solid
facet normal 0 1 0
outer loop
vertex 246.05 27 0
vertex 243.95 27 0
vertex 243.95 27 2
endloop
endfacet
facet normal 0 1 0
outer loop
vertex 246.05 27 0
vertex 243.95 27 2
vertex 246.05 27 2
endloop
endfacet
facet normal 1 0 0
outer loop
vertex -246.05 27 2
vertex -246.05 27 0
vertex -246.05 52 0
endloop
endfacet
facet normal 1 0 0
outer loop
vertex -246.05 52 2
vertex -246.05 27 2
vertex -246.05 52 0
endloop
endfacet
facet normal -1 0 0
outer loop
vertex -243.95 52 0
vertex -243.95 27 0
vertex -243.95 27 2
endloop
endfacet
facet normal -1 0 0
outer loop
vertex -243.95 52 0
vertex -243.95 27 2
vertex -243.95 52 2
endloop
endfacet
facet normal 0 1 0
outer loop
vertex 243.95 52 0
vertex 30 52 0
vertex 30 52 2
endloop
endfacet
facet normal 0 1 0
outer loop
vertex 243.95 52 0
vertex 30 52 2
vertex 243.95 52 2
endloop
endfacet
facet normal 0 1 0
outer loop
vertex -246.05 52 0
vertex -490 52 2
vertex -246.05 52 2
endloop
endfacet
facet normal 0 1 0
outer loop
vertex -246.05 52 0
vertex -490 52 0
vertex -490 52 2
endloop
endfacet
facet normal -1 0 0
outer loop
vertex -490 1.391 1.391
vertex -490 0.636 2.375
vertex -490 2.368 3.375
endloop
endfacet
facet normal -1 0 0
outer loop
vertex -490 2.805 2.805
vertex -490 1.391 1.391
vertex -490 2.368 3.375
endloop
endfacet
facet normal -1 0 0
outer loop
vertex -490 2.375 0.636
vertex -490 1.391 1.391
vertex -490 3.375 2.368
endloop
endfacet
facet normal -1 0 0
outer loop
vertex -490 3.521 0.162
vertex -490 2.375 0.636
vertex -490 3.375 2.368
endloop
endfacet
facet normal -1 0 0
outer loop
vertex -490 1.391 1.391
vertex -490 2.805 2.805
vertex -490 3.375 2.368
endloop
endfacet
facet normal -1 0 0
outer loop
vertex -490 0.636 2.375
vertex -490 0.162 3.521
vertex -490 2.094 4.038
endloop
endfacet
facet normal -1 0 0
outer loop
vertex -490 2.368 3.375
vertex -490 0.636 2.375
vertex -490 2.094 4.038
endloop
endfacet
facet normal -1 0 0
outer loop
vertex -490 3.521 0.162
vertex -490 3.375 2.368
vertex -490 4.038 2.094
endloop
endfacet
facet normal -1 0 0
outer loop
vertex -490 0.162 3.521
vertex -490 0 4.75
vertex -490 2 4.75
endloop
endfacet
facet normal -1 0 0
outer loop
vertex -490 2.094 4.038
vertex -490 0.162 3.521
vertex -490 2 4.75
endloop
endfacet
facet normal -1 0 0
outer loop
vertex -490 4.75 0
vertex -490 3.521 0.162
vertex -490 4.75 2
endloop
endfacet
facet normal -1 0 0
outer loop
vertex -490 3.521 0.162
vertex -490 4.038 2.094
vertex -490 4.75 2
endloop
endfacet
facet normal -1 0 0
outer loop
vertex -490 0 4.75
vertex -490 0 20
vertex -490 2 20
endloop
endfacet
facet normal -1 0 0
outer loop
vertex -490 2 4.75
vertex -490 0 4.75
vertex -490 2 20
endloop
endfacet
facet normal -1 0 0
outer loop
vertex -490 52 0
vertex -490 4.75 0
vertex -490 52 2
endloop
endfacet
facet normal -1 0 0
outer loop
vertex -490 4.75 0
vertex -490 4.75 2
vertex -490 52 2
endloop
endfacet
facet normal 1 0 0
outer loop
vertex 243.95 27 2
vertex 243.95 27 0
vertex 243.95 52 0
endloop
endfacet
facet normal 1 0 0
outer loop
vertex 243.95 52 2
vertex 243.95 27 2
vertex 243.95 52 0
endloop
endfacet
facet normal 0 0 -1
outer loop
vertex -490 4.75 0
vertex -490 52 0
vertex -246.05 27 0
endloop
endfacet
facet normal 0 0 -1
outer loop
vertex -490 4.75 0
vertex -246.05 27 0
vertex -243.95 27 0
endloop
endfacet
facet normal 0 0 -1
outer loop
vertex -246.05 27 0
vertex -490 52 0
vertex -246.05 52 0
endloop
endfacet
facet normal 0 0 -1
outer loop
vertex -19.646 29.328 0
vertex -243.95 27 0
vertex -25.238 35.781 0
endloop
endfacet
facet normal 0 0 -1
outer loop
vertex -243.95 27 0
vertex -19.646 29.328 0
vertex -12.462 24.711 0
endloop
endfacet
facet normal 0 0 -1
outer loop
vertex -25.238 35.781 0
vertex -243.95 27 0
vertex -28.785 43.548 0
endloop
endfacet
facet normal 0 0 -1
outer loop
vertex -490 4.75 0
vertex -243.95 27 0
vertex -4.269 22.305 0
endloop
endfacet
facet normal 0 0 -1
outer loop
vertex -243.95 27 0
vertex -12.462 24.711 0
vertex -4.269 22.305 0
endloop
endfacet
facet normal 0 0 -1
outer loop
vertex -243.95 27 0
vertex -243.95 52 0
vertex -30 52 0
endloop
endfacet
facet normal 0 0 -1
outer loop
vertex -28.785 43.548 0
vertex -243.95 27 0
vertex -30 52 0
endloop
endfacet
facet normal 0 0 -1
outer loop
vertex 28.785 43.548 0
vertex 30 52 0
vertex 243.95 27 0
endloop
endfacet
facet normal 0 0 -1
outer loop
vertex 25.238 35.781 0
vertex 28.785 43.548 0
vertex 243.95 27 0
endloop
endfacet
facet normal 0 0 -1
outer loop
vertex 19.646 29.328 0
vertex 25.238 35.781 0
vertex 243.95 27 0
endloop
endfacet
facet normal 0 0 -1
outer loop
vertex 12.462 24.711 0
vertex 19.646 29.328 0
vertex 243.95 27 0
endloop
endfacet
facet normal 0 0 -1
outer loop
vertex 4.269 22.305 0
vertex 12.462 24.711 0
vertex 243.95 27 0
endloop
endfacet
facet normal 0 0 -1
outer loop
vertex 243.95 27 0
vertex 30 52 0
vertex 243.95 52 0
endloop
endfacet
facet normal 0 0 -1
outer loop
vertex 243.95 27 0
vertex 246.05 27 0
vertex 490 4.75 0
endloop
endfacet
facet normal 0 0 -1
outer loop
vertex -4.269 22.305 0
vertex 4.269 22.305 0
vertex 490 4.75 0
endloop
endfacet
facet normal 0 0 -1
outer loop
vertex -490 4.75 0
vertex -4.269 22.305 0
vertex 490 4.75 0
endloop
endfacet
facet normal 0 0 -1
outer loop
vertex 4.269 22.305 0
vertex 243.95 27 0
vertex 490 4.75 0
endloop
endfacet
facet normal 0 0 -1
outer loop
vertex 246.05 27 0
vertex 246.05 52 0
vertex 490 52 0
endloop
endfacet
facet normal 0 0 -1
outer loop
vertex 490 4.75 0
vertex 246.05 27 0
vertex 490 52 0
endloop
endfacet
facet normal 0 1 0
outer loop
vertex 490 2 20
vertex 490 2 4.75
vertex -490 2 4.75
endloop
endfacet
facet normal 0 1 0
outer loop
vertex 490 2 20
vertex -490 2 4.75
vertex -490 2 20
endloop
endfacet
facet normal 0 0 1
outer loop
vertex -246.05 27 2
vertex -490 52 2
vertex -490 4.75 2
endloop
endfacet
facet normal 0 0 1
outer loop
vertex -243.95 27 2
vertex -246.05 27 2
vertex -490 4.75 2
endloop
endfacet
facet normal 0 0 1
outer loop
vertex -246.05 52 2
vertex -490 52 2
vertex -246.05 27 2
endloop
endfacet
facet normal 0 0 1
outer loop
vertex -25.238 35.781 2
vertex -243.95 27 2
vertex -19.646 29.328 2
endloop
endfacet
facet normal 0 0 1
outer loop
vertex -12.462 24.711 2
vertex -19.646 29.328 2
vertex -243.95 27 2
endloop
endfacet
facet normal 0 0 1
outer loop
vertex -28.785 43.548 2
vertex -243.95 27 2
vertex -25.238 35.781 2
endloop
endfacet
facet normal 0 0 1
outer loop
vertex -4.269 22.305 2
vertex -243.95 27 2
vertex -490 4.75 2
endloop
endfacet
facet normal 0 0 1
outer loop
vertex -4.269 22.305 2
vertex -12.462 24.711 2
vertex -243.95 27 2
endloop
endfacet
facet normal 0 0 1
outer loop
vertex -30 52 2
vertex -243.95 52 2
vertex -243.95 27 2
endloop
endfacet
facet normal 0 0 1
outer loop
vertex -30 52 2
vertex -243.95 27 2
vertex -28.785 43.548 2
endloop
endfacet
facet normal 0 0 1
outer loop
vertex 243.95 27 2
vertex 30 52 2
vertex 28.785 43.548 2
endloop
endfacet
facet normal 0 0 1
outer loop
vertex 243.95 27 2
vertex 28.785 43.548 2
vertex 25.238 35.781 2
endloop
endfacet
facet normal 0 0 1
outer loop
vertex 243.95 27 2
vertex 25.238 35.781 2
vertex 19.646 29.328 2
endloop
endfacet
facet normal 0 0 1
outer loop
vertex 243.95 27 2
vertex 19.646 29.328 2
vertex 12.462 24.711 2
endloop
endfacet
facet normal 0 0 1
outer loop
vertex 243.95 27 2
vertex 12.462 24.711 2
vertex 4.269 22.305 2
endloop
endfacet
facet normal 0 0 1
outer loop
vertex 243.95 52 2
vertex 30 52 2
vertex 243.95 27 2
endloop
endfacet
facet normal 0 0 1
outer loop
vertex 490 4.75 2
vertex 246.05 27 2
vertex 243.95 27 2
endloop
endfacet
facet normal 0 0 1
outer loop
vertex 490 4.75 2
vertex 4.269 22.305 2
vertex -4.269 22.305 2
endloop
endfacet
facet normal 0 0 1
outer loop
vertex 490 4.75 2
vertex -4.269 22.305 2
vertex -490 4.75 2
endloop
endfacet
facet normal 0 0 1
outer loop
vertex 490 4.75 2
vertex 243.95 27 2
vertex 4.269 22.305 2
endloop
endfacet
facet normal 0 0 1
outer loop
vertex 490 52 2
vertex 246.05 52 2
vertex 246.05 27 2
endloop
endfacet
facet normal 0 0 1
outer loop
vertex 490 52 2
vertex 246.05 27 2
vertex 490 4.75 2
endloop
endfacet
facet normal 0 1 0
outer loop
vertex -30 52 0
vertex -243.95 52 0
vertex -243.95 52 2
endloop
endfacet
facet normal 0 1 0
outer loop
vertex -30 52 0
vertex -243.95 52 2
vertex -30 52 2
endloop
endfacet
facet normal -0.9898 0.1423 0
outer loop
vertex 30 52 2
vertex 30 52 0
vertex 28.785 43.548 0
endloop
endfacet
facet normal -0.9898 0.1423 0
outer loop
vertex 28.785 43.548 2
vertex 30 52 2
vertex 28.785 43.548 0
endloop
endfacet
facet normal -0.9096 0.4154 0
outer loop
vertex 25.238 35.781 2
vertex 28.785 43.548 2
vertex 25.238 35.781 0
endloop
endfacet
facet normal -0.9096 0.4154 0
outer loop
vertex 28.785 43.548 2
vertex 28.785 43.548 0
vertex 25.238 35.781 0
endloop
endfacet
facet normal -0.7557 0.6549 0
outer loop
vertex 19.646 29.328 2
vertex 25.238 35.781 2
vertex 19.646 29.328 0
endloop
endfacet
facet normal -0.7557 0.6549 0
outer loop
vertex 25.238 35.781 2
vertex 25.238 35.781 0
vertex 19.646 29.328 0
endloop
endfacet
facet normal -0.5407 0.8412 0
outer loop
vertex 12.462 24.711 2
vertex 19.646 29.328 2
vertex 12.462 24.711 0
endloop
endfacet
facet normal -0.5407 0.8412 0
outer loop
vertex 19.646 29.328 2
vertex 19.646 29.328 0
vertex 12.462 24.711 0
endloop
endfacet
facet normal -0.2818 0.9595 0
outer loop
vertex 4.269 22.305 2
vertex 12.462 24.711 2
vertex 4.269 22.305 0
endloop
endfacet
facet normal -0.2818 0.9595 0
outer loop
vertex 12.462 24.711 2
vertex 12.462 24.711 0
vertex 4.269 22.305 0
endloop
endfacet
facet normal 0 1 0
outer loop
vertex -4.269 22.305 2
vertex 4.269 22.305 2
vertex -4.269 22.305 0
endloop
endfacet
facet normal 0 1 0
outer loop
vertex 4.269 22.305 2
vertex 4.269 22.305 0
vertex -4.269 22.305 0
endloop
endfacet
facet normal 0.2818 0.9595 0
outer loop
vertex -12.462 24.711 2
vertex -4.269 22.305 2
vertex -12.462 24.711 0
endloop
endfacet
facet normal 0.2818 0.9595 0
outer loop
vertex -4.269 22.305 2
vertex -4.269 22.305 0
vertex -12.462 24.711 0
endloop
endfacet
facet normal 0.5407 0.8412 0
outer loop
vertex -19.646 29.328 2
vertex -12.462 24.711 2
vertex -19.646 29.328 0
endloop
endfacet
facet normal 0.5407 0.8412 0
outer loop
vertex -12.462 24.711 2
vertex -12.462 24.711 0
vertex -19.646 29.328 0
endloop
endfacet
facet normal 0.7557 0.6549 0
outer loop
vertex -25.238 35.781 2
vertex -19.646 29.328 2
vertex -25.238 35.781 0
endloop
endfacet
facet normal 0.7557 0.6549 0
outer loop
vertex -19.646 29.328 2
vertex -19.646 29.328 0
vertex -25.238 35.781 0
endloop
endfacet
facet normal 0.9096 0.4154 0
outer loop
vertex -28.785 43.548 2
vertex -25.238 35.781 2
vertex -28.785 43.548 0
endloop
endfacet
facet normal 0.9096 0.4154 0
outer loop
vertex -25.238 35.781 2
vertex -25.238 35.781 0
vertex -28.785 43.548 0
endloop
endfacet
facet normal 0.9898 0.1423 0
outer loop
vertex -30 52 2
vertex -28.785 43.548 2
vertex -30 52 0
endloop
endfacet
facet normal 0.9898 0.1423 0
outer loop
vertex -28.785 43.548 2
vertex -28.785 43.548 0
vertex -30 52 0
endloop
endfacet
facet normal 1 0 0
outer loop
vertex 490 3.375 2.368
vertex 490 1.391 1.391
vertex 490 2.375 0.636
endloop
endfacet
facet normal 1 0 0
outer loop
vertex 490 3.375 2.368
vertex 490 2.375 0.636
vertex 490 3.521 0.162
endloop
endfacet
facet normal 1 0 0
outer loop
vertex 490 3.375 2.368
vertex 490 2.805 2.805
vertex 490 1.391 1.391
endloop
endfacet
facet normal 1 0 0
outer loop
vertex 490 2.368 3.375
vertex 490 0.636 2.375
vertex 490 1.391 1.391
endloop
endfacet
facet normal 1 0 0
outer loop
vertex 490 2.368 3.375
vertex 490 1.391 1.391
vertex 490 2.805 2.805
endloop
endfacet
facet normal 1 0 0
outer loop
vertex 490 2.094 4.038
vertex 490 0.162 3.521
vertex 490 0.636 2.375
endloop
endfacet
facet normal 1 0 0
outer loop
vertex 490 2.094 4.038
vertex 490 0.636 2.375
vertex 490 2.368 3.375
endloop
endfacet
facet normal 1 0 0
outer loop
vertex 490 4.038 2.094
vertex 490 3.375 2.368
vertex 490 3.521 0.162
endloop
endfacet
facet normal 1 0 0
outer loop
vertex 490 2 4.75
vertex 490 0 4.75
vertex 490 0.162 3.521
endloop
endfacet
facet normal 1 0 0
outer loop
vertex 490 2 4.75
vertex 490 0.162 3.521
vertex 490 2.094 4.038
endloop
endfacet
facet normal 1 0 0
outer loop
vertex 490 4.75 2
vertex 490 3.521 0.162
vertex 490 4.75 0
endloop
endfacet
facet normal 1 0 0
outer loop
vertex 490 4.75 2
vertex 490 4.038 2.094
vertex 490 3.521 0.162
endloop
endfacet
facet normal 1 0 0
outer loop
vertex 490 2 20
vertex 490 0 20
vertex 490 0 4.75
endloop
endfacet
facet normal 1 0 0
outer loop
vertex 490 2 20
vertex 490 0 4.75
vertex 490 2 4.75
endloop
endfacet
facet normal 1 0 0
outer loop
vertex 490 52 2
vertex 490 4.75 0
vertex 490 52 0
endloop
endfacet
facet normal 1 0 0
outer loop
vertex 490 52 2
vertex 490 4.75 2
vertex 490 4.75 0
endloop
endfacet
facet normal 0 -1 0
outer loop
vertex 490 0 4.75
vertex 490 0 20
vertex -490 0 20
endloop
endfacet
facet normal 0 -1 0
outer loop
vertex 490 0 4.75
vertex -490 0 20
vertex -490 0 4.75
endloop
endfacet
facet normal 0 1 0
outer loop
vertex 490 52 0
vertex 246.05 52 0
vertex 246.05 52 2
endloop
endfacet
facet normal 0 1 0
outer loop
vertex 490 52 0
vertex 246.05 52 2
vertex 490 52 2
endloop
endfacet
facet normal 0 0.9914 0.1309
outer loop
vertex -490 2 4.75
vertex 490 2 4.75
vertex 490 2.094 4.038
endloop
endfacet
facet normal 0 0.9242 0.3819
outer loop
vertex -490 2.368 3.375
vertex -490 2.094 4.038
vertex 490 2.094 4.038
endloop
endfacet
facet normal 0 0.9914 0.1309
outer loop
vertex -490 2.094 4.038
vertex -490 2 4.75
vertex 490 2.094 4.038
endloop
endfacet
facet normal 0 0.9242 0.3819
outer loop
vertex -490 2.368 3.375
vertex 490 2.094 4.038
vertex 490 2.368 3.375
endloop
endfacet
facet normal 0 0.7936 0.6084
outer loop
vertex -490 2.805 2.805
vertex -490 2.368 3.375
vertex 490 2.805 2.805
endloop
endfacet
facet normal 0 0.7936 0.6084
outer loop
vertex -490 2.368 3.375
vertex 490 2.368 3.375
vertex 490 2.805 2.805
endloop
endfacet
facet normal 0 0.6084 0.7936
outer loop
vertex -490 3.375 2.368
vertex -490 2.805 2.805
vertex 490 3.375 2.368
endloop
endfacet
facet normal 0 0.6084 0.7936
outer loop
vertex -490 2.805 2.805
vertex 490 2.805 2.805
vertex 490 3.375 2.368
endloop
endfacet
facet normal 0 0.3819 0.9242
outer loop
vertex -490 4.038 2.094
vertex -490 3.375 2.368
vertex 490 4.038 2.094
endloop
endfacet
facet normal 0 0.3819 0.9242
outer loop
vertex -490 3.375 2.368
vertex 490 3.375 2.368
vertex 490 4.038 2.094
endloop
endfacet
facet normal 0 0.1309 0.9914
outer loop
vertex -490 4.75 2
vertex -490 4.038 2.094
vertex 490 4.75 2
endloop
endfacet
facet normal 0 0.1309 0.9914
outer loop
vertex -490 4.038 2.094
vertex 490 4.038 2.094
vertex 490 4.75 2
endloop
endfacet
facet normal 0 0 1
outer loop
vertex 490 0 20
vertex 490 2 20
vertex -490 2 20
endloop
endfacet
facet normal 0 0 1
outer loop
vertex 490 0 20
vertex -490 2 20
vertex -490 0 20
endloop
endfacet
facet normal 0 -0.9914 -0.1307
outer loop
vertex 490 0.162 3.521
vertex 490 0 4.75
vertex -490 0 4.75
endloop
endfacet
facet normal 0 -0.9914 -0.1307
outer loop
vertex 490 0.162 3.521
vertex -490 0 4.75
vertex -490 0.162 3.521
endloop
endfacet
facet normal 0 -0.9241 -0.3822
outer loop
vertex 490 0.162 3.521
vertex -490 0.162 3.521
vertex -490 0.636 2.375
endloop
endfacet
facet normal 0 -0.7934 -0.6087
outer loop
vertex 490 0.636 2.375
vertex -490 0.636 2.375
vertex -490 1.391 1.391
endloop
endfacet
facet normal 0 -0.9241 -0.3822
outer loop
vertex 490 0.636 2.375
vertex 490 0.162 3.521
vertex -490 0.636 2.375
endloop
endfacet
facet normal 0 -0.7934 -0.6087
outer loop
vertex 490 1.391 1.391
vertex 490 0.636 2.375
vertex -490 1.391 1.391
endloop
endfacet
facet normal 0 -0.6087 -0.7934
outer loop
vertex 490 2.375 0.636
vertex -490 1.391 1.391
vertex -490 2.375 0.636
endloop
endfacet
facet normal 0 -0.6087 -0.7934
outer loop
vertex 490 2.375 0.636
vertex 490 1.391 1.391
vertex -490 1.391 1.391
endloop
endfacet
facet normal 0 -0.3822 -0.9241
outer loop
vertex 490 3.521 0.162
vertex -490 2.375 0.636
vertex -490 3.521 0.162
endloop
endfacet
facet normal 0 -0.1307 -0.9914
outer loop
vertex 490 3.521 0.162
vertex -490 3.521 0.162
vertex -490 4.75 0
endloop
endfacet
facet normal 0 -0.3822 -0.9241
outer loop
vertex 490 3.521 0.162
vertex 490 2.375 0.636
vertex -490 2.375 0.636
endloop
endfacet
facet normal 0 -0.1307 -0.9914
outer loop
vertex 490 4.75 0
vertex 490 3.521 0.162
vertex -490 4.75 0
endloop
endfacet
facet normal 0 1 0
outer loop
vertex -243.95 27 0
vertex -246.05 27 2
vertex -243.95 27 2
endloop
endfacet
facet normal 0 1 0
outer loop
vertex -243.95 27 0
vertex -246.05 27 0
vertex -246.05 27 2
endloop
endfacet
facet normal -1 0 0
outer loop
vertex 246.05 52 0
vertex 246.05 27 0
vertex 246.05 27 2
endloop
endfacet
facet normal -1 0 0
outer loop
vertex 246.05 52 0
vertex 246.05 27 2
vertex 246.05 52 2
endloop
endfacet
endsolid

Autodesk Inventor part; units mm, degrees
ref_plane "YZ Plane" through (0, 0, 0) normal (1, 0, 0) x (0, 1, 0)
ref_plane "XZ Plane" through (0, 0, 0) normal (0, 1, 0) x (-1, 0, 0)
ref_plane "XY Plane" through (0, 0, 0) normal (0, 0, 1) x (1, 0, 0)
sketch "Sketch1" plane through (0, 0, 0) normal (0, 0, 1) x (1, 0, 0)
  line L0 (-490, 52) -> (490, 52)
  line L1 (490, 52) -> (490, 0)
  line L2 (490, 0) -> (-490, 0)
  line L3 (-490, 0) -> (-490, 52)
  point P0 (0, 0)
  point P1 (0, 0)
  dimension "d0" = 980
  dimension "d1" = 52
extrude "Plate1" add sketch "Sketch1" along normal blind 2
sketch "Sketch2" plane through (490, 2, 0) normal (0, -1, 0) x (1, 0, 0)
  line L0 (-980, 0) -> (0, 0)
  line L1 (0, 0) -> (0, 20)
  line L2 (0, 20) -> (-980, 20)
  line L3 (-980, 20) -> (-980, 0)
edge flange "Flange1" height 20 angle 90 thickness 2 bend radius 2.75 thickness toward (0, -1, 0) relief round relief width 2 relief depth 1 edges at (0, 0, 2) wall of the first edge with corners at (-490, 2, 0) (490, 2, 0) (490, 2, 20) (-490, 2, 20)
bend "Bend1"
corner "Corner1"
sketch "Sketch11" plane through (0, 0, 0) normal (0, 0, 1) x (1, 0, 0)
  line L0 (-490, 52) -> (490, 52) projected
  circle A0 centre (0, 52) radius 30
  line L1 (-490, 0) -> (490, 0) projected
  line L2 (246.05, 0) -> (243.95, 0)
  line L3 (243.95, 0) -> (243.95, 27)
  line L4 (243.95, 27) -> (246.05, 27)
  line L5 (246.05, 27) -> (246.05, 0)
  line L6 (-243.95, 0) -> (-246.05, 0)
  line L7 (-246.05, 0) -> (-246.05, 27)
  line L8 (-246.05, 27) -> (-243.95, 27)
  line L9 (-243.95, 27) -> (-243.95, 0)
  line L10 (0, 52) -> (0, 0) construction
  line L11 (246.05, 27) -> (246.05, 52)
  line L12 (243.95, 27) -> (243.95, 52)
  line L13 (-243.95, 27) -> (-243.95, 52)
  line L14 (-246.05, 27) -> (-246.05, 52)
  point P0 (30, 52)
  point P1 (-30, 52)
  point P2 (-245, 27)
  point P3 (245, 27)
  dimension "d44" = 60
  dimension "d47" = 2.1
  dimension "d49" = 490
  dimension "d50" = 27
extrude "Extrusion4" cut sketch "Sketch11" along normal through all both and the other way through all contours L0 L13 L8 L14 | L0 A0 | L0 L11 L4 L12 picked at (3.546, 42.6498)
sketch "Sketch9" plane through (0, 0, 2) normal (0, 0, 1) x (1, 0, 0)
  line L0 (475.4727, 47) -> (475.4727, 35) construction
  line L1 (475.4727, 35) -> (275.4727, 35) construction
  line L2 (275.4727, 35) -> (275.4727, 47) construction
  line L3 (275.4727, 47) -> (475.4727, 47) construction
  line L4 (-490, 52) -> (490, 52) projected
  point P0 (0, 0)
  point P1 (1, 52)
  dimension "d38" = 200
  dimension "d39" = 12
  dimension "d43" = 5
mark "Mark3"
equation "\"d1\" = СПИНА_Стрингер_1_высота"
equation "\"d43\" = d42"
equation "\"d2\" = Thickness"
equation "\"d3\" = BendReliefWidth"
equation "\"d4\" = BendReliefDepth"
equation "\"d5\" = MinimumRemnant"
equation "\"d6\" = TransitionRadius"
equation "\"d9\" = BendRadius"
equation "\"d10\" = CornerReliefSize"
equation "\"d11\" = GapSize"
equation "\"d12\" = JacobiRadiusSize"
equation "\"BendReliefWidth\" = Thickness"
equation "\"BendReliefDepth\" = 0.5 * Thickness"
equation "\"CornerReliefSize\" = 4 * Thickness"
equation "\"MinimumRemnant\" = 2 * Thickness"
equation "\"TransitionRadius\" = BendRadius"
equation "\"JacobiRadiusSize\" = BendRadius"
equation "\"GapSize\" = Thickness"
equation "\"СПИНА_Стрингер_1_высота\" = 52"
equation "\"d42\" = 5"
equation "\"Thickness\" = 2"
equation "\"BendRadius\" = 2.75"
properties part number "MSC 205 STRINGER BACK ^" material "Stainless Steel"
